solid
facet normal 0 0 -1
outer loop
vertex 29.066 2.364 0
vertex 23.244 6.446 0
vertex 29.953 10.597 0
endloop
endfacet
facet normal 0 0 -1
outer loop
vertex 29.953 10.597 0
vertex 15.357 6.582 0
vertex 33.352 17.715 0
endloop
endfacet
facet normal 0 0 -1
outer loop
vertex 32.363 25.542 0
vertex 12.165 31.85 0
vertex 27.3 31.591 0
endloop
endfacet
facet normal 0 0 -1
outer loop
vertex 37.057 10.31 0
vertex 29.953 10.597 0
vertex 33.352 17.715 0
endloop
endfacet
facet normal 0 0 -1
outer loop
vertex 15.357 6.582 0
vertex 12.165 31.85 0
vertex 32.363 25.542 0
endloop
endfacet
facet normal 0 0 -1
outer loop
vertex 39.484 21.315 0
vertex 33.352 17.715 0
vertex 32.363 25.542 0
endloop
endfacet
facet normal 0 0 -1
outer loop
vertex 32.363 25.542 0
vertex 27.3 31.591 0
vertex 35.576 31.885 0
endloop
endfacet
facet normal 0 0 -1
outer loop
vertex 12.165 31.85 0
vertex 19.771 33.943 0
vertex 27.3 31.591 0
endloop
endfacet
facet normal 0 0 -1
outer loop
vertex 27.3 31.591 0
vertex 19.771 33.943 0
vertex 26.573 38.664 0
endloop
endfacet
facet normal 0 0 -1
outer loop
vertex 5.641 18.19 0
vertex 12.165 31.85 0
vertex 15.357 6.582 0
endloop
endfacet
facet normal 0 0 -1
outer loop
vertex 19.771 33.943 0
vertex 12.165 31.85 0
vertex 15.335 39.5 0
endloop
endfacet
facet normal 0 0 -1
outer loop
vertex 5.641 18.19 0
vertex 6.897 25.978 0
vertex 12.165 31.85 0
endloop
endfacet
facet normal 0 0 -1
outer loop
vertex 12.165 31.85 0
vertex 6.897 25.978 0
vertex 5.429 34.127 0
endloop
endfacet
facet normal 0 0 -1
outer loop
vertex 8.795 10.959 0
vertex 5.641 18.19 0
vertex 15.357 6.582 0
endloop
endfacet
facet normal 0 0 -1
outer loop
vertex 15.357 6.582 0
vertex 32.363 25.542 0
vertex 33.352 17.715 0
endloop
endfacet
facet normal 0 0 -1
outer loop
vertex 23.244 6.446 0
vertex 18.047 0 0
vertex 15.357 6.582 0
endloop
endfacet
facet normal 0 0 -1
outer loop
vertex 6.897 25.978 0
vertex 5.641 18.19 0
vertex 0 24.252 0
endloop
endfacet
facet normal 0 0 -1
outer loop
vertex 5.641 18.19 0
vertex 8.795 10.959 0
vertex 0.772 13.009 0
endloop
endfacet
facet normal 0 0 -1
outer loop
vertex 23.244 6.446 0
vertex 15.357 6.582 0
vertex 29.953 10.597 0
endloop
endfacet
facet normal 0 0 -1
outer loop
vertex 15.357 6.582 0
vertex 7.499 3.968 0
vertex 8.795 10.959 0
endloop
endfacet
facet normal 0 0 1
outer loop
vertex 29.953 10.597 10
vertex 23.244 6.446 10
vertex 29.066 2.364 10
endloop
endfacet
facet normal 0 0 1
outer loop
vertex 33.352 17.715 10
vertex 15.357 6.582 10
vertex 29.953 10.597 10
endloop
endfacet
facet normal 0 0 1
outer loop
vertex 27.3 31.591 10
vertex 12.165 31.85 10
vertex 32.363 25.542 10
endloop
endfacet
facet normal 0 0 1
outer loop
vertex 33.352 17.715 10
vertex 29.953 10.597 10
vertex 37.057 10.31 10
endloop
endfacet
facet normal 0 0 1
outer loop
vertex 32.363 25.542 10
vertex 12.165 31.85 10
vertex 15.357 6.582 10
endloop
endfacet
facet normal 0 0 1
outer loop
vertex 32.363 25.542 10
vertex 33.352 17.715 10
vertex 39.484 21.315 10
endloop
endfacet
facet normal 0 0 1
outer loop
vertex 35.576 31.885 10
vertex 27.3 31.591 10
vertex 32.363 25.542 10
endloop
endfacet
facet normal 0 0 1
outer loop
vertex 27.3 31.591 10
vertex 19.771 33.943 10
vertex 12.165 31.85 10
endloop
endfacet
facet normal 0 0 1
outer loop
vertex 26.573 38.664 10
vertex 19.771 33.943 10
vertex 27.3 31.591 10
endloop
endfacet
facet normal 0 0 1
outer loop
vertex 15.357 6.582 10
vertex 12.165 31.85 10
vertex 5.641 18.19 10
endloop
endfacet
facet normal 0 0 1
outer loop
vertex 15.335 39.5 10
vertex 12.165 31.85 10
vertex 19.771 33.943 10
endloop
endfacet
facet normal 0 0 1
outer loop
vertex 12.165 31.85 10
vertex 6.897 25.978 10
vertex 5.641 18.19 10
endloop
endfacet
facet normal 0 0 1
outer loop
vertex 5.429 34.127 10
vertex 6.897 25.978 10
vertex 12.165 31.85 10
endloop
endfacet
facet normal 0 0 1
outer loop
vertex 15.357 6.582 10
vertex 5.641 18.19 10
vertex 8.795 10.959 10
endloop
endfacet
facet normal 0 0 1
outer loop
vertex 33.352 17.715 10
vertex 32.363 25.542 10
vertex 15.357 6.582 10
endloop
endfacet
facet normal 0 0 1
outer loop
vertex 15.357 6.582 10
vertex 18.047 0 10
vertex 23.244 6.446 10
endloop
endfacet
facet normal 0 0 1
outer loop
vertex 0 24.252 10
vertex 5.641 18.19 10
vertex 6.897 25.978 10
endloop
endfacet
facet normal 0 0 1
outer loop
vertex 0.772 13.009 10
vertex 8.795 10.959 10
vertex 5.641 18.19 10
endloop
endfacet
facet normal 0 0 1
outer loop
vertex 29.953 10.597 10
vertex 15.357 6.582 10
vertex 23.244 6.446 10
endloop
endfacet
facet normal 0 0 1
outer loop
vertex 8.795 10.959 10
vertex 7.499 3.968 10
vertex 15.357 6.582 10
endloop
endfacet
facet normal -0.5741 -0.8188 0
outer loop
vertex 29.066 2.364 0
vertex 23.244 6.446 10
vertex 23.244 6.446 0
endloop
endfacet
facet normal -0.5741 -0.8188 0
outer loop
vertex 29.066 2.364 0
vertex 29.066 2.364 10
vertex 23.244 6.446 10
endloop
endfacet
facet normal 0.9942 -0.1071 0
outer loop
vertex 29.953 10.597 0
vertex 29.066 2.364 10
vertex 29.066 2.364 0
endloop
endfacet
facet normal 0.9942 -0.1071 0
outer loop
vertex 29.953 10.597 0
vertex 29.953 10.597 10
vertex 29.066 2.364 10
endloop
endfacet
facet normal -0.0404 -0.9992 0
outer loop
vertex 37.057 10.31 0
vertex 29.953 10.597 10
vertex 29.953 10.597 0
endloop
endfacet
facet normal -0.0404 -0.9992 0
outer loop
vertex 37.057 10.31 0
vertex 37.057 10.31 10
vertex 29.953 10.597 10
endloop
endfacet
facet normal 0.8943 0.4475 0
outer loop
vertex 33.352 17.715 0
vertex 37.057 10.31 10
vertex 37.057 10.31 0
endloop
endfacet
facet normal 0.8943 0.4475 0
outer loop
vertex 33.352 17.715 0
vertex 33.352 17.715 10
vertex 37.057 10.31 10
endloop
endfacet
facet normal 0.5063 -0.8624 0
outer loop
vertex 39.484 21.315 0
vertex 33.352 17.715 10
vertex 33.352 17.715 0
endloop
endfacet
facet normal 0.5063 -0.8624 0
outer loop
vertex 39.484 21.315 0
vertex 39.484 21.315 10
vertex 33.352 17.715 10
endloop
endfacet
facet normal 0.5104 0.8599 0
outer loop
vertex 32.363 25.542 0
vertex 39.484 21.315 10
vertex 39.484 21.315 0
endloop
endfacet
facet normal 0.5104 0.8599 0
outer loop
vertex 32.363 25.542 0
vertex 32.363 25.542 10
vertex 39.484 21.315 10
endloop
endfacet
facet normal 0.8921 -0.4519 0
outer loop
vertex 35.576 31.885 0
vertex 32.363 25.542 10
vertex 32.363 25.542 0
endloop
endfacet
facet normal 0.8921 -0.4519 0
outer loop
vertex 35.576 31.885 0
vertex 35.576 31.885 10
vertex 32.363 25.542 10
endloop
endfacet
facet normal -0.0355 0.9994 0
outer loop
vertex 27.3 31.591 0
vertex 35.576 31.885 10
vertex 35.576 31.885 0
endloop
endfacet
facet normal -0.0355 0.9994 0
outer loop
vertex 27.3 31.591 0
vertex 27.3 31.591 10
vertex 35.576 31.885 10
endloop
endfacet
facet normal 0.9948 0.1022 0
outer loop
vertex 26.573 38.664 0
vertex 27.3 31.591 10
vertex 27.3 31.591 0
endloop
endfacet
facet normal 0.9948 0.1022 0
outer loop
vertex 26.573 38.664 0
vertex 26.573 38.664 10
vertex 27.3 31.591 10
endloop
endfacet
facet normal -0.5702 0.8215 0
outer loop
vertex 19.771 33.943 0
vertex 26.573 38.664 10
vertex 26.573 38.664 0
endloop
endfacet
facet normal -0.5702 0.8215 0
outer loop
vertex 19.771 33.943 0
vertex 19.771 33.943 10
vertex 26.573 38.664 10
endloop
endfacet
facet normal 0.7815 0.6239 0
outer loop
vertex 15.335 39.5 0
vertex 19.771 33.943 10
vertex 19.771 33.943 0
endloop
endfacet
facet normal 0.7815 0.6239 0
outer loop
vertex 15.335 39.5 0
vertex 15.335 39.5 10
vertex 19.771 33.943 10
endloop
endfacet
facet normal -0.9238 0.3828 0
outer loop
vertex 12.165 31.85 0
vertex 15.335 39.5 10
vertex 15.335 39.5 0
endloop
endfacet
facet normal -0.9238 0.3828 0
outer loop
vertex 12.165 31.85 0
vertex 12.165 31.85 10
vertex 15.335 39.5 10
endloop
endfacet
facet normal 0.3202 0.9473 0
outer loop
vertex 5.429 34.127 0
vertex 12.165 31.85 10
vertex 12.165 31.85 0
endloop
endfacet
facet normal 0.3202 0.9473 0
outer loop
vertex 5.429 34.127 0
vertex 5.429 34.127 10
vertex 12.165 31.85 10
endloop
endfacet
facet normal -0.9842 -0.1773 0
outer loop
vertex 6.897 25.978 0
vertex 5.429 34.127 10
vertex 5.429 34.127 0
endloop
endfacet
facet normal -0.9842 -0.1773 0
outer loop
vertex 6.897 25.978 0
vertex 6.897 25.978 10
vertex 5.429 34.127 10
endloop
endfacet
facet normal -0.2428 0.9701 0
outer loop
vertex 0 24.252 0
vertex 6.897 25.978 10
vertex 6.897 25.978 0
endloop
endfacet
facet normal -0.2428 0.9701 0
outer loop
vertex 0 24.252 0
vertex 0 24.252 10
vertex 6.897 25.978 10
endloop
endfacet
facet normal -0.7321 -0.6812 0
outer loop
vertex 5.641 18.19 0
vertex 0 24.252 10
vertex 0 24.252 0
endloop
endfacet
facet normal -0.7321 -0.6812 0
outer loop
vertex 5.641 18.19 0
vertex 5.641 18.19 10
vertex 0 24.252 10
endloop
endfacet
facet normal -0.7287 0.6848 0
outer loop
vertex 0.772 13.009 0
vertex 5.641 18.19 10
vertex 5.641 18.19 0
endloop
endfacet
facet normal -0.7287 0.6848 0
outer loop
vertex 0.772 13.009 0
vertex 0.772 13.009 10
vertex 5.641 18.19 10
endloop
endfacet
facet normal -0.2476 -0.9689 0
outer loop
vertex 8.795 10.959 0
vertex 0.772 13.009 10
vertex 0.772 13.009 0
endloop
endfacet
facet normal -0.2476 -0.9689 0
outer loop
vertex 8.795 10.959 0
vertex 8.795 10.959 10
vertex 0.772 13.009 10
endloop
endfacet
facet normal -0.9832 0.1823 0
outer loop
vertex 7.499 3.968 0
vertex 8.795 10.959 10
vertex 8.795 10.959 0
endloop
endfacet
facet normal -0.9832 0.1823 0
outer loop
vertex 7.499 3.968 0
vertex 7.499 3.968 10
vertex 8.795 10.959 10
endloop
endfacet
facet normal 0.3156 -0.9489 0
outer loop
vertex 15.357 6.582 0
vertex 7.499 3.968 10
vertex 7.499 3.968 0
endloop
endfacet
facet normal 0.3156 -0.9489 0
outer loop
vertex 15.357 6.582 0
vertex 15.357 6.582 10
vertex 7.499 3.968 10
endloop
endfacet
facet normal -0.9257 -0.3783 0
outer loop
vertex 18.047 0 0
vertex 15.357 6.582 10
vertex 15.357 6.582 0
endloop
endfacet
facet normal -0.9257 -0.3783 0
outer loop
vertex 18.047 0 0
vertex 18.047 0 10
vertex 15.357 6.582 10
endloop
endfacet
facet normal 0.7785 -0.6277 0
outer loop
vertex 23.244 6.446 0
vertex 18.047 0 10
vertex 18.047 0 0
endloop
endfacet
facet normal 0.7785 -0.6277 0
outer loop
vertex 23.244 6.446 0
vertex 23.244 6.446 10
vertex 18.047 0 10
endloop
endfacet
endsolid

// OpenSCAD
$fn = 32;

// ----------------------------------------------------------------------
// Chain sprocket: 11 teeth, 14 mm root radius
// ----------------------------------------------------------------------

// --- parameters (mm) ---
profile_height = 10;      // extrusion height
profile_points = 22;      // points of the closed outline

profile = [[33.352, 17.715], [39.484, 21.315], [32.363, 25.542], [35.576, 31.885], [27.3, 31.591], [26.573, 38.664], [19.771, 33.943], [15.335, 39.5], [12.165, 31.85], [5.429, 34.127], [6.897, 25.978], [0, 24.252], [5.641, 18.19], [0.772, 13.009], [8.795, 10.959], [7.499, 3.968], [15.357, 6.582], [18.047, 0], [23.244, 6.446], [29.066, 2.364], [29.953, 10.597], [37.057, 10.31]];  // single closed polygon, 22 points, counter clockwise

// --- the one profile operation ---
linear_extrude(height = profile_height) polygon(points = profile);
